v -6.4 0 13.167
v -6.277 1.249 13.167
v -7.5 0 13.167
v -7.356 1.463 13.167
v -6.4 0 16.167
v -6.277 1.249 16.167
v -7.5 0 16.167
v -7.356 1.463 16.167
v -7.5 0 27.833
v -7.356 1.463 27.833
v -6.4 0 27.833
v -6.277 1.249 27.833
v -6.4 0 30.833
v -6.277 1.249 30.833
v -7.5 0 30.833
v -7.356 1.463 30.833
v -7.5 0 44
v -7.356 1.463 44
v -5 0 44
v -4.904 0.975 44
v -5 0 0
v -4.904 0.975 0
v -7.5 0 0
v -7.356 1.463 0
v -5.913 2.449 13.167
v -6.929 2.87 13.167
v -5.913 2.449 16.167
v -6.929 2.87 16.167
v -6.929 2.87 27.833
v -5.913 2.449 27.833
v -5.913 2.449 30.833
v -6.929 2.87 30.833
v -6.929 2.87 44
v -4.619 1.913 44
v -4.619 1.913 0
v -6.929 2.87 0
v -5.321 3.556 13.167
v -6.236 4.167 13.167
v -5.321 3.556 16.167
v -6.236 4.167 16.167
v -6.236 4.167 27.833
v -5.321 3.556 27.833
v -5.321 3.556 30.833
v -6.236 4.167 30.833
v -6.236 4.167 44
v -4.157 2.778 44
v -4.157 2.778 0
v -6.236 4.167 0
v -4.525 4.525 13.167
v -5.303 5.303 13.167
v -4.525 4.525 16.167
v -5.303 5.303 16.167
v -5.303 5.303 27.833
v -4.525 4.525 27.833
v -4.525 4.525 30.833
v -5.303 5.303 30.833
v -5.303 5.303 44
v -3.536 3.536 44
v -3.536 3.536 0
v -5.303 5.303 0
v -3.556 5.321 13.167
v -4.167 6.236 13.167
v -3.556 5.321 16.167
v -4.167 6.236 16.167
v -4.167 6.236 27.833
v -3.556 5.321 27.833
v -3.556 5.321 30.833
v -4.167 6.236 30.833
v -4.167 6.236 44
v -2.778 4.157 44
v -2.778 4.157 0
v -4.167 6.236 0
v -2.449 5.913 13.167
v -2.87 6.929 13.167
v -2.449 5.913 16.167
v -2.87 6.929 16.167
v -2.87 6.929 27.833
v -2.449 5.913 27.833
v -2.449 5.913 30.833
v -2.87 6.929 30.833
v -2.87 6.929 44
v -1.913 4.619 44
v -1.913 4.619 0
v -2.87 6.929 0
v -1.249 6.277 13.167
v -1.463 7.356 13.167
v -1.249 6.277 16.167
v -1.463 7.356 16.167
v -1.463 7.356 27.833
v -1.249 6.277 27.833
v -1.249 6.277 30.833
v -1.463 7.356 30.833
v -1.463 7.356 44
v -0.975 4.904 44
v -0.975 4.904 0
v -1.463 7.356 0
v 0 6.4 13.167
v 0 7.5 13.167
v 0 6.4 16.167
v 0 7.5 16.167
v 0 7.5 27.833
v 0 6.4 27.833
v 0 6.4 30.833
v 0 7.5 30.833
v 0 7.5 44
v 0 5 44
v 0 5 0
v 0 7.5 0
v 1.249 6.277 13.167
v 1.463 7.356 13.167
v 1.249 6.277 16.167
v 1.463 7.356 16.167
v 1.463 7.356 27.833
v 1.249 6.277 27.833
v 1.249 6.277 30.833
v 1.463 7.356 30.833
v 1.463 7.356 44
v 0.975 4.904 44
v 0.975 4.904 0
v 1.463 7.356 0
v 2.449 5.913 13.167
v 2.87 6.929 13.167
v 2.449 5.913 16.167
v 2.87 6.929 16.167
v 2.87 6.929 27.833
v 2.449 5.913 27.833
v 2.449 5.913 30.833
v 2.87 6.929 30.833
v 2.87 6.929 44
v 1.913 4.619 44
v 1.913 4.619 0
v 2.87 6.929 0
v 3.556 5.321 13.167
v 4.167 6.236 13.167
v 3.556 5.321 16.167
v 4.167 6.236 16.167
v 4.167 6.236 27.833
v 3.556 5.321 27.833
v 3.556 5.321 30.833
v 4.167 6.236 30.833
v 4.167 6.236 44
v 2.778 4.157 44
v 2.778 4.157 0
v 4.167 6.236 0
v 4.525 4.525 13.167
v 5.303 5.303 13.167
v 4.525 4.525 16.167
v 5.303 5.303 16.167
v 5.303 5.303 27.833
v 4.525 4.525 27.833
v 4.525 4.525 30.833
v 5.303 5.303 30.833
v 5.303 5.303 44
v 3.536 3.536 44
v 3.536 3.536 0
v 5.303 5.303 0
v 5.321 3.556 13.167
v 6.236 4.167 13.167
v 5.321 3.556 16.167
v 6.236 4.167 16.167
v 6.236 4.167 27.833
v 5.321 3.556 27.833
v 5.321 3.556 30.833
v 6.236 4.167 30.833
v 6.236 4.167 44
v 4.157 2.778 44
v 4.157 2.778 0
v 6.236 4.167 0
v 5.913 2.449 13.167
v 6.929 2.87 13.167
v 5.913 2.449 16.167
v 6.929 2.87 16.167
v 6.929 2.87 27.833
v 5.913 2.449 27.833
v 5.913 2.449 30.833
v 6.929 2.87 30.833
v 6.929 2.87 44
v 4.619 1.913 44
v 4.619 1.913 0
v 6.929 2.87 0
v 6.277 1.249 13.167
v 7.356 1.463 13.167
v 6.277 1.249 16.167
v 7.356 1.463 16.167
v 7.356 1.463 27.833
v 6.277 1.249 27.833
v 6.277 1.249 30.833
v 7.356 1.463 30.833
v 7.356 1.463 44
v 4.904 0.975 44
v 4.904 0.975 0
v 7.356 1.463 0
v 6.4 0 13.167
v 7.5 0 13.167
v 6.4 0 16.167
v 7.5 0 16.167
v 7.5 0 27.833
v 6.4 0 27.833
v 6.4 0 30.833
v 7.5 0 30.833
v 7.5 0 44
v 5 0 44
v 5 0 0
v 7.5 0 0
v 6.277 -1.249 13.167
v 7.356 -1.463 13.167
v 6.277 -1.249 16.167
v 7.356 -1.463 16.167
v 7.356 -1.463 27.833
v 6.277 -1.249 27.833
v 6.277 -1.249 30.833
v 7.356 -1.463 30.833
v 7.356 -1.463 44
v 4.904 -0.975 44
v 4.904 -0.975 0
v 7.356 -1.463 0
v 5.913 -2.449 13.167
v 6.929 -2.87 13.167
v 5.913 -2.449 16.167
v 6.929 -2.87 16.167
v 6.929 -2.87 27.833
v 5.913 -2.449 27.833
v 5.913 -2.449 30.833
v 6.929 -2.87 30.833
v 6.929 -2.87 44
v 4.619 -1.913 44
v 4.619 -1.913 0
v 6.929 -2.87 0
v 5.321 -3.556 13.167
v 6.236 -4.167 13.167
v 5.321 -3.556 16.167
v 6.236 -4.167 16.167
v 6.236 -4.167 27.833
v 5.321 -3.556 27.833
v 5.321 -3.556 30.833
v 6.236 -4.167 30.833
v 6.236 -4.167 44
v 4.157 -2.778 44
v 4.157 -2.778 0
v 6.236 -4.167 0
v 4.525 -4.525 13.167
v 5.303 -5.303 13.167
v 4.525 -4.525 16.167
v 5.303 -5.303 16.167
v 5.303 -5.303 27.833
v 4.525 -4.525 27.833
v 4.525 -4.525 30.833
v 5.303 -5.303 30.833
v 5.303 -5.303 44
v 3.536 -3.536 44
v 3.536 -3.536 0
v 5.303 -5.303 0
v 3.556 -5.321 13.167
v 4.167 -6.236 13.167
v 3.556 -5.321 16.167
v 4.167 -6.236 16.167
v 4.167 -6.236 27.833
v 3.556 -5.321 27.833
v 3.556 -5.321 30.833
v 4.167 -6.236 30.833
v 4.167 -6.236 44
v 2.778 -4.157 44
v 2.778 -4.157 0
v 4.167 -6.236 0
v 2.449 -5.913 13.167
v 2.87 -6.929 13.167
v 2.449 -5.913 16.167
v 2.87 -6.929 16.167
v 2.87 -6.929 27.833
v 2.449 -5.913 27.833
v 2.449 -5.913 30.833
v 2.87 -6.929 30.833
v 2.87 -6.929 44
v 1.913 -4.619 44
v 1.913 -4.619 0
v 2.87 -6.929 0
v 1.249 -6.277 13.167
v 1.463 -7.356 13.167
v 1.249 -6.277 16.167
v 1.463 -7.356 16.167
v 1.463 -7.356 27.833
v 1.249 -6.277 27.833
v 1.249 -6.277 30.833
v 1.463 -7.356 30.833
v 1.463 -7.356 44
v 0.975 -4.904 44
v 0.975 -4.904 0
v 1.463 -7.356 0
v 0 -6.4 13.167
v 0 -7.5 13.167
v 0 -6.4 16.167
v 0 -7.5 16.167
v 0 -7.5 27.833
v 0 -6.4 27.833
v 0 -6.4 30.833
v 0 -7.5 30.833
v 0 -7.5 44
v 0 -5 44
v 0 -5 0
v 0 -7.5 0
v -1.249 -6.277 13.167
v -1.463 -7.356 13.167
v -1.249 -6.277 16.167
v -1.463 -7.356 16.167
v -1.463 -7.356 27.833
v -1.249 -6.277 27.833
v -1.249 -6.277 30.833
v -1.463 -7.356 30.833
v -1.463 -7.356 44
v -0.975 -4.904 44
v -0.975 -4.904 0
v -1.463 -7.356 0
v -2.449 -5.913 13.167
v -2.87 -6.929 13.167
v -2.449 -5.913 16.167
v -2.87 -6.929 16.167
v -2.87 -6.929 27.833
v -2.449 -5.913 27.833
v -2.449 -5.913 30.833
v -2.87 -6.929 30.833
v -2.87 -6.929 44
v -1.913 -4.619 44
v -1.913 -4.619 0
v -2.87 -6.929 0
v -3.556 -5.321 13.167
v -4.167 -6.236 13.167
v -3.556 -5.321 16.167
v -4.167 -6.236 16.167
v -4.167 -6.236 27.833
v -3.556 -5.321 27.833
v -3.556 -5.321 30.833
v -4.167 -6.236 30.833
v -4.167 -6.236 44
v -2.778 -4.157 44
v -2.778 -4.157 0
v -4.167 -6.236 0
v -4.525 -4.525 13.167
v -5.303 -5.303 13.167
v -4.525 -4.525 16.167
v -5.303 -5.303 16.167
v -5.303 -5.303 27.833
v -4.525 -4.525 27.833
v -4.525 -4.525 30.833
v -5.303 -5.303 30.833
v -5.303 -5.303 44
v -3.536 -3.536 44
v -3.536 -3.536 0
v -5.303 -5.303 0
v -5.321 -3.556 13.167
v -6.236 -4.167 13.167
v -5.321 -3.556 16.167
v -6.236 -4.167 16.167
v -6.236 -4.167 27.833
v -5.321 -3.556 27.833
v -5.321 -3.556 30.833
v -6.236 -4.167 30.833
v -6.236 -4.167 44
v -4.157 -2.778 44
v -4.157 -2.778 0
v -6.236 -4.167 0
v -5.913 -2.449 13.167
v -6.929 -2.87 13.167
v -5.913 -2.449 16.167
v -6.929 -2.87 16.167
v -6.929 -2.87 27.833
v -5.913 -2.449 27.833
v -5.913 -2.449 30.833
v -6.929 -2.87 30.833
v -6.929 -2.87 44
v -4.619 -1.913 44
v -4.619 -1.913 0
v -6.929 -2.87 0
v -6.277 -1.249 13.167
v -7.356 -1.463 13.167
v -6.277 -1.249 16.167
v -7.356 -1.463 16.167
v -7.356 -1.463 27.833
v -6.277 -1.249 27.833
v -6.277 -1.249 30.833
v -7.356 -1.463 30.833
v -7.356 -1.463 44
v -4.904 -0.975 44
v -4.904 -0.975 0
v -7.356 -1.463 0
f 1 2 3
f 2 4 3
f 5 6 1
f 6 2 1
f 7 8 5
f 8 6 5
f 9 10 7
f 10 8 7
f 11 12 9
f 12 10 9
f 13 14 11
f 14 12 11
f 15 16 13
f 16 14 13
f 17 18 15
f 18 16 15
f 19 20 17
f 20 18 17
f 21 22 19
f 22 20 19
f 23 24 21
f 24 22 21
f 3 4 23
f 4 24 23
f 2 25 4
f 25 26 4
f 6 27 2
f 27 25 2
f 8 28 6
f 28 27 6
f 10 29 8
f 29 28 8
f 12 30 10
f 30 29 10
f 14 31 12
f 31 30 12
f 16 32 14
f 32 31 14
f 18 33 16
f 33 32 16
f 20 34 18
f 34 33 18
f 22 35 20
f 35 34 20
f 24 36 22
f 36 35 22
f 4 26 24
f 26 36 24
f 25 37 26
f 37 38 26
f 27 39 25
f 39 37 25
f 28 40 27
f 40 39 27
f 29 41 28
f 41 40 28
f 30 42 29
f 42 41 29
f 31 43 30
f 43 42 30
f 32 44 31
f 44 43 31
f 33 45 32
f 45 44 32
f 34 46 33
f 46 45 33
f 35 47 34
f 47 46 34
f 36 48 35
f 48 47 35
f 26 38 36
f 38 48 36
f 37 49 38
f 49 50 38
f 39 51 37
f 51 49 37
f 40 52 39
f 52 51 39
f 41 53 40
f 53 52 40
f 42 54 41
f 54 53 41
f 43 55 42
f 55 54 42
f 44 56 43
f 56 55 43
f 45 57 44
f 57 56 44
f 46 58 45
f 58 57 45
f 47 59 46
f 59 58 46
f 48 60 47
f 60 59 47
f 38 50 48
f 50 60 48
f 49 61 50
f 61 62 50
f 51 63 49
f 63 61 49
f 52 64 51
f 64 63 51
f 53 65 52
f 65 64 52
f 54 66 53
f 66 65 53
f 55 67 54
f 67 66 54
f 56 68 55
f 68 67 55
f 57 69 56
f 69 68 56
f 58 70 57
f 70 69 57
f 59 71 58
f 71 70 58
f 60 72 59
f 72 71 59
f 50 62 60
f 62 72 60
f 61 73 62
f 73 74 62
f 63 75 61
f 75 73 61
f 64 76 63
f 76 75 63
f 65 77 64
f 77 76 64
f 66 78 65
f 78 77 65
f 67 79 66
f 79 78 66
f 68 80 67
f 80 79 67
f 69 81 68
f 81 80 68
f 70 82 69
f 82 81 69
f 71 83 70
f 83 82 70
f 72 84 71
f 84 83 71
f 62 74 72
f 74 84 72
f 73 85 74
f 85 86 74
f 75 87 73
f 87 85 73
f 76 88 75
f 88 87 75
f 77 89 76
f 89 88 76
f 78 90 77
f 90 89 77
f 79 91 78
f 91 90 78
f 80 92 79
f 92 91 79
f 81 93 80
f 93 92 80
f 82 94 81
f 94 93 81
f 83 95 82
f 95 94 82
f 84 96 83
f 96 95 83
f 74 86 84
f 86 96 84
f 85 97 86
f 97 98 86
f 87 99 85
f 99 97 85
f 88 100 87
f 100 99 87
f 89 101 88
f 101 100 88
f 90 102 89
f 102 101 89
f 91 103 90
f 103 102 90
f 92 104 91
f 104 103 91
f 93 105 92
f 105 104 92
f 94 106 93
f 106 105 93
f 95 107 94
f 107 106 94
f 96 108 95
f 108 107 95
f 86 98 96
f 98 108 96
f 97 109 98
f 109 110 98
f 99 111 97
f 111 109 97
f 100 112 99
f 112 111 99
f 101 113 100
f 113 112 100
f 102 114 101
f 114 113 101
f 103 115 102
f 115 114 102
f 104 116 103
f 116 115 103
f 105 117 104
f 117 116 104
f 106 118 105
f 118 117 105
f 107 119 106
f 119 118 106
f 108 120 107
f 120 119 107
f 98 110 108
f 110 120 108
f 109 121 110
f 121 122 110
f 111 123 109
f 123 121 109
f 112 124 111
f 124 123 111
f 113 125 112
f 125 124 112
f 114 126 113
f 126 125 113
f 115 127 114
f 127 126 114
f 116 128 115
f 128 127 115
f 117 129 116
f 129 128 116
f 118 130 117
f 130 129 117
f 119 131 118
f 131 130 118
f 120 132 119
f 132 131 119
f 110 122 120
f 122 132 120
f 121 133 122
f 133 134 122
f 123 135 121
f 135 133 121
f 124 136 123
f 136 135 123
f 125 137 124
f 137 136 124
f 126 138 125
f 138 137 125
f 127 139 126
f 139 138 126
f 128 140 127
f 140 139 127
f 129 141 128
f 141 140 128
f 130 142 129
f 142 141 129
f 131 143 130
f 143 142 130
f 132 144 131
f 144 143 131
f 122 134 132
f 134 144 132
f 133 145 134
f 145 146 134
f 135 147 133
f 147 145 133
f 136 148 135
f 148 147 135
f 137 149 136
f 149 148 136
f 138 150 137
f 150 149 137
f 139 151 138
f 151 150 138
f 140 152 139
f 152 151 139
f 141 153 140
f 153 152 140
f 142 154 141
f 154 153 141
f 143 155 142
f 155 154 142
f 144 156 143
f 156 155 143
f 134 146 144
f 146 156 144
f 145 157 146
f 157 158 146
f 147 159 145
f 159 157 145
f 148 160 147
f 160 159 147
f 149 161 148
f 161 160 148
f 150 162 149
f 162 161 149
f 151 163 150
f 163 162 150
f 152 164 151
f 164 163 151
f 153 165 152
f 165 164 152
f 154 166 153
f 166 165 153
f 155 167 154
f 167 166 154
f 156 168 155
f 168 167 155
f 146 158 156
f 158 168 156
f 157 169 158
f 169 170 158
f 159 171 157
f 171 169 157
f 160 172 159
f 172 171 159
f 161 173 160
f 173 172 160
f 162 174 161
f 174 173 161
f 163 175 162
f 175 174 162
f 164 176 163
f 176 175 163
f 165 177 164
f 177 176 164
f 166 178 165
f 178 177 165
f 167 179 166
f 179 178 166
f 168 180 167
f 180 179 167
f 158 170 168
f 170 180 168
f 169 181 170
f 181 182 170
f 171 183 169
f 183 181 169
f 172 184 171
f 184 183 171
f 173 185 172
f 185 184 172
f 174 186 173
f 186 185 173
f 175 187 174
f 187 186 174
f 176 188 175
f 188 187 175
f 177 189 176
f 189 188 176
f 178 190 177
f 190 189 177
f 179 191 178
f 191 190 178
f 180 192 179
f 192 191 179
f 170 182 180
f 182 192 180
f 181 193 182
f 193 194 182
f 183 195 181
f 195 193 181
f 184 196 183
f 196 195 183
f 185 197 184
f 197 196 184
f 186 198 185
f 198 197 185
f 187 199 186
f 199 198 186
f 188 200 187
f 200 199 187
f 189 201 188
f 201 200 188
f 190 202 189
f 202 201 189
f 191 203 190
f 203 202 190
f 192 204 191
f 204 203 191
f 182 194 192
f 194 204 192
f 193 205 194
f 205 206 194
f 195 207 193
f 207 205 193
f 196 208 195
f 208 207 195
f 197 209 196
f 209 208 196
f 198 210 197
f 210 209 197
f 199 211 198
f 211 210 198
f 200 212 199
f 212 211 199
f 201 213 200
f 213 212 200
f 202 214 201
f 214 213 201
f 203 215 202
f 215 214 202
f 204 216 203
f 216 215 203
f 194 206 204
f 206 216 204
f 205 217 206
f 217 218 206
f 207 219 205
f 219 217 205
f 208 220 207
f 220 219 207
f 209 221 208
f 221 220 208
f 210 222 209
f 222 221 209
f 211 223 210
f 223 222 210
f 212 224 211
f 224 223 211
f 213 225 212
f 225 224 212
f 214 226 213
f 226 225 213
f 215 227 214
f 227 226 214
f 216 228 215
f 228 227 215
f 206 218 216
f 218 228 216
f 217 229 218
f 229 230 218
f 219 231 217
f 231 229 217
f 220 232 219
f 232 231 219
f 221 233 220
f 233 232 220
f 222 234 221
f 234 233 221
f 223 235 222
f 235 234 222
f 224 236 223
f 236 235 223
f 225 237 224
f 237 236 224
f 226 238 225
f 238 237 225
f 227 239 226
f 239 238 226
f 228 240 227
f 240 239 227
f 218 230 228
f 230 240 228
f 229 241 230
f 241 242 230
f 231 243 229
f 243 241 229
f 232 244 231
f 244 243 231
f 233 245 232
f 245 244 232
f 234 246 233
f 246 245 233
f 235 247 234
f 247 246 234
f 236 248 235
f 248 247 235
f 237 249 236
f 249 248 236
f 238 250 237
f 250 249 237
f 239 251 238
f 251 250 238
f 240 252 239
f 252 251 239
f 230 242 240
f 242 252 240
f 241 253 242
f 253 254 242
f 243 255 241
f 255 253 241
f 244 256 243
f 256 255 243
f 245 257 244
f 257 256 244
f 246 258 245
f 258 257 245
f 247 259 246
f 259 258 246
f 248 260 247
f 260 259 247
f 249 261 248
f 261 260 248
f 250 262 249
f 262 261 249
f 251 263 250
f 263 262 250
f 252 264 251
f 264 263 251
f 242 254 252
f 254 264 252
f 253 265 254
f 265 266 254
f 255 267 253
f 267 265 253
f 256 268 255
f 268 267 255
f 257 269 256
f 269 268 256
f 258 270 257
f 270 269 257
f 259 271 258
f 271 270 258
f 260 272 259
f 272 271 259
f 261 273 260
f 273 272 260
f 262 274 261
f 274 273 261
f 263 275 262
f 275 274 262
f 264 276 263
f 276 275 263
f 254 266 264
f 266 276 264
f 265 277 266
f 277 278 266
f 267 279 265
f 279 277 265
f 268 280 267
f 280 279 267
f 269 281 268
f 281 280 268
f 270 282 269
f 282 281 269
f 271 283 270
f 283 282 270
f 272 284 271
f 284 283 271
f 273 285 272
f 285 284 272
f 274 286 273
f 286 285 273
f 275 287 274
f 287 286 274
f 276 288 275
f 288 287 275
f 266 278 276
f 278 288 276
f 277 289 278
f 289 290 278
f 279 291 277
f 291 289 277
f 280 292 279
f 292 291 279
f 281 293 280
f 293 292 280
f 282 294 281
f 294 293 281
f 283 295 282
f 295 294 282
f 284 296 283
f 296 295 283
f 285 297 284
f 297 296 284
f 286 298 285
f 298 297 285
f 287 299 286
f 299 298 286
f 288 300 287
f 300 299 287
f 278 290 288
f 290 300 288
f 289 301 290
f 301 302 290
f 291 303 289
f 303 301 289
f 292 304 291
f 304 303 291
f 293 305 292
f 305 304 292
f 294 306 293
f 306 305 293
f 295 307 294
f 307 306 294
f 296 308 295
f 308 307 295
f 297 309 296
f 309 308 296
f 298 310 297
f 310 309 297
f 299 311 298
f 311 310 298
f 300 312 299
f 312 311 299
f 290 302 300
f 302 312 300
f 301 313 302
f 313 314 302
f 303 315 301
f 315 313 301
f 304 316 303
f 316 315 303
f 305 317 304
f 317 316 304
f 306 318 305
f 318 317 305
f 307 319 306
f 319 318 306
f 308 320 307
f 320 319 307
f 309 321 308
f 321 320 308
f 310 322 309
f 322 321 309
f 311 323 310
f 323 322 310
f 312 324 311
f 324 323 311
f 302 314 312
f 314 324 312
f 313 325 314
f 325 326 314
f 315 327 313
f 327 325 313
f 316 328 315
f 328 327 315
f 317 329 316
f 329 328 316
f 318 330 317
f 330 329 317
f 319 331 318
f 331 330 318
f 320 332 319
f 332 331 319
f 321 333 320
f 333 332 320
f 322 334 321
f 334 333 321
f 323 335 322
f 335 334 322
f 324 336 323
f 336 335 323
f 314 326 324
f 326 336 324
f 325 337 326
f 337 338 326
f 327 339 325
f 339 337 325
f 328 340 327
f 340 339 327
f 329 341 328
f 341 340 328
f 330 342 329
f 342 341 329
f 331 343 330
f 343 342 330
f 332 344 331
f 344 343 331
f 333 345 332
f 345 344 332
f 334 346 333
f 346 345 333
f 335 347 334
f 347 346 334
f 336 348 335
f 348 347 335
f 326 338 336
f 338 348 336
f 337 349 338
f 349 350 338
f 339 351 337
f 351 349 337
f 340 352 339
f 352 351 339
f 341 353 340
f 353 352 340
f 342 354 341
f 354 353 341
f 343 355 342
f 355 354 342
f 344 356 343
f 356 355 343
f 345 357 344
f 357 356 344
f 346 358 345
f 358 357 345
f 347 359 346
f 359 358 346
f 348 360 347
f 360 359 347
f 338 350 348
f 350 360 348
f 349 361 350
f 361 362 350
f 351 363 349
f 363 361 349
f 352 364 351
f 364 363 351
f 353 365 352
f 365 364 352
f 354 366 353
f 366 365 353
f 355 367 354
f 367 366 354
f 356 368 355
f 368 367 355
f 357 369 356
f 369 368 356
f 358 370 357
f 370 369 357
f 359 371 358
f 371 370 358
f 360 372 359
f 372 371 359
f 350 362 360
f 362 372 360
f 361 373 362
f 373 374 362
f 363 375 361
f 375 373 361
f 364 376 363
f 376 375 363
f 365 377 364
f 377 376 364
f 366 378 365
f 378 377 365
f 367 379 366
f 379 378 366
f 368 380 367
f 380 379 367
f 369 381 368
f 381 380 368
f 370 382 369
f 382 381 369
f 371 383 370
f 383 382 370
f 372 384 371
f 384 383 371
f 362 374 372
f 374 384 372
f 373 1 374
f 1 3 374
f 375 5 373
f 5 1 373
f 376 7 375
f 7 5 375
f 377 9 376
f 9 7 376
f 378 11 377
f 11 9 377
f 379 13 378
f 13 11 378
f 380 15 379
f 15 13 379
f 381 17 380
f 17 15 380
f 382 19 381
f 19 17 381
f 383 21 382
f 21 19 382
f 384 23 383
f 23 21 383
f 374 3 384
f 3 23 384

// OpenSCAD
$fn = 32;

// ----------------------------------------------------------------------
// Grooved revolve: plain_grooves, bore R5
// ----------------------------------------------------------------------

// --- parameters (mm) ---
bore_r = 5;               // bore radius
outer_r = 7.5;            // outer radius of the body
total_h = 44;             // overall height, Z
wall = 2.5;               // radial wall thickness
groove_w = 3;             // groove width
groove_d = 1.1;           // groove depth
grooves = 2;              // number of outer grooves

bbox_x = 2 * outer_r;  // full diameter
bore_d = 2 * bore_r;  // bore diameter
body_d = 2 * outer_r;  // body diameter
revolve_angle = 360;  // full turn around the Z axis

profile = [[5, 0], [7.5, 0], [7.5, 13.167], [6.4, 13.167], [6.4, 16.167], [7.5, 16.167], [7.5, 27.833], [6.4, 27.833], [6.4, 30.833], [7.5, 30.833], [7.5, 44], [5, 44]];  // primary outline, 12 points, counter clockwise

// --- the one profile operation ---
rotate_extrude(angle = revolve_angle) polygon(points = profile);
